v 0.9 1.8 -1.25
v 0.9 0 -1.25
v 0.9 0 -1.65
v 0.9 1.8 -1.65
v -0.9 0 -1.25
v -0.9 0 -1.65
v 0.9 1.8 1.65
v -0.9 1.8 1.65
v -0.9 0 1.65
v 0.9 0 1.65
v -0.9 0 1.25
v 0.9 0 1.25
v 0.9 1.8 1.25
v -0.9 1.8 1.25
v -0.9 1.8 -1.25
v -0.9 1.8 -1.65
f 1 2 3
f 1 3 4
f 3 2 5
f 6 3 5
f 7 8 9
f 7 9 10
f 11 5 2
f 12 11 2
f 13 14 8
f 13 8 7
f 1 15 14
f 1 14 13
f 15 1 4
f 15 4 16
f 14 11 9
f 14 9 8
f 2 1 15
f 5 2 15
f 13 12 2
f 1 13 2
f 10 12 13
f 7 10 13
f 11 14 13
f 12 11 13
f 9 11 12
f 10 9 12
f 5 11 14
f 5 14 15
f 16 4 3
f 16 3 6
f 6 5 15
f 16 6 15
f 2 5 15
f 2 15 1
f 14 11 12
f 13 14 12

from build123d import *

# Parameters (mm, degrees)
SKETCH1_W  = 1.8
SKETCH1_H  = 2.5
MB_DEPTH   = 1.8
SKETCH2_W  = 1.8
SKETCH2_H  = 1.8
SB_L_DEPTH = 0.4
SKETCH3_W  = 1.8
SKETCH3_H  = 1.8
SB_R_DEPTH = 0.4


with BuildPart() as part:
    # Sketch1 → MB (new body)
    with BuildSketch(Plane(origin=(0, 0, 0), x_dir=(1, 0, 0), z_dir=(0, 1, 0))):
        Rectangle(SKETCH1_W, SKETCH1_H)
    extrude(amount=MB_DEPTH)


with BuildPart() as body_2:
    # Sketch2 → SB L (new body)
    with BuildSketch(Plane.XY.offset(1.25)):
        with Locations((0, 0.9)):
            Rectangle(SKETCH2_W, SKETCH2_H)
    extrude(amount=SB_L_DEPTH)


with BuildPart() as body_3:
    # Sketch3 → SB R (new body)
    with BuildSketch(Plane(origin=(0, 0, -1.25), x_dir=(-1, 0, 0), z_dir=(0, 0, -1))):
        with Locations((0, 0.9)):
            Rectangle(SKETCH3_W, SKETCH3_H)
    extrude(amount=SB_R_DEPTH)


solid = Compound([part.part, body_2.part, body_3.part])
